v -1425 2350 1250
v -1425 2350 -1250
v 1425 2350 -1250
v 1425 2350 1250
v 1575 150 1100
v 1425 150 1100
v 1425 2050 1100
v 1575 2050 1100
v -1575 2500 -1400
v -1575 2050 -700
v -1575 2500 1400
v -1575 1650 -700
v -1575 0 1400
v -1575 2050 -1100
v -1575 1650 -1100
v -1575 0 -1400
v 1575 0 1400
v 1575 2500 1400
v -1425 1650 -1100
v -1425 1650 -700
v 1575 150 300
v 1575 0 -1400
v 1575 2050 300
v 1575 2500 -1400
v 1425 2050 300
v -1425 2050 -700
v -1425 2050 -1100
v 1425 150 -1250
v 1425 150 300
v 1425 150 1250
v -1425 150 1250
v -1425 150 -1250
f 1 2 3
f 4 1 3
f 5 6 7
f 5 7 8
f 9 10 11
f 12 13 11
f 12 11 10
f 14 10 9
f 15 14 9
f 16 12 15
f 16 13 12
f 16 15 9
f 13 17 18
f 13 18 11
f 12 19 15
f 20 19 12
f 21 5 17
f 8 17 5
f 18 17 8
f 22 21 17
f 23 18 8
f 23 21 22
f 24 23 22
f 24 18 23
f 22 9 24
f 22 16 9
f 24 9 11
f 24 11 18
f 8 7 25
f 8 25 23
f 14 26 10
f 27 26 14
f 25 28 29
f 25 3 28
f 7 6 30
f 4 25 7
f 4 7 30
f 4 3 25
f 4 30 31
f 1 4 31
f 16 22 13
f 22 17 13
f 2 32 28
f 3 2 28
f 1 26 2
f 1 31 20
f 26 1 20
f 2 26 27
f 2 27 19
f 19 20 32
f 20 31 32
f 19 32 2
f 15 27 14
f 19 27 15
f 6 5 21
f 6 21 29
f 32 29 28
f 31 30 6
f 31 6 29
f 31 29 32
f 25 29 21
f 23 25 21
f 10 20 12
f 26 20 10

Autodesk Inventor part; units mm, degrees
ref_plane "YZ Plane" through (0, 0, 0) normal (1, 0, 0) x (0, 1, 0)
ref_plane "XZ Plane" through (0, 0, 0) normal (0, 1, 0) x (-1, 0, 0)
ref_plane "XY Plane" through (0, 0, 0) normal (0, 0, 1) x (1, 0, 0)
sketch "Náčrt1" plane through (0, 0, 0) normal (0, 1, 0) x (-1, 0, 0)
  line L0 (-1575, 1400) -> (1575, 1400)
  line L1 (1575, 1400) -> (1575, -1400)
  line L2 (1575, -1400) -> (-1575, -1400)
  line L3 (-1575, -1400) -> (-1575, 1400)
  line L4 (-1575, 1400) -> (1575, -1400) construction
  line L5 (1575, 1400) -> (-1575, -1400) construction
  point P0 (0, 0)
  dimension "d0" = 3150
  dimension "d1" = 2800
extrude "Vysunutí1" add sketch "Náčrt1" along normal blind 150
sketch "Náčrt2" plane through (0, 150, 0) normal (0, 1, 0) x (1, 0, 0)
  line L0 (-1575, -1400) -> (1575, -1400) projected
  line L1 (1575, -1400) -> (1575, 1400) projected
  line L2 (1575, 1400) -> (-1575, 1400) projected
  line L3 (-1575, 1400) -> (-1575, -1400) projected
  line L4 (1425, -1250) -> (-1425, -1250)
  line L5 (-1425, -1250) -> (-1425, 1250)
  line L6 (-1425, 1250) -> (1425, 1250)
  line L7 (1425, -1250) -> (-1425, 1250) construction
  line L8 (-1425, -1250) -> (1425, 1250) construction
  line L9 (1425, -1100) -> (1575, -1100)
  line L10 (1575, -1400) -> (1575, 1400) projected
  line L11 (1425, -300) -> (1575, -300)
  line L12 (1425, 1250) -> (1425, -300)
  line L13 (1425, -1100) -> (1425, -1250)
  line L14 (1575, -300) -> (1575, 1400)
  line L15 (-1575, 1400) -> (-1575, -1400) projected
  line L16 (-1575, 1400) -> (-1575, -1400)
  line L17 (-1575, -1400) -> (1575, -1400) projected
  line L18 (-1575, -1400) -> (1575, -1400)
  line L19 (1575, -1400) -> (1575, -1100)
  point P0 (0, 0)
  dimension "d4" = 2850
  dimension "d5" = 2500
  dimension "d6" = 150
  dimension "d7" = 800
extrude "Vysunutí2" add sketch "Náčrt2" along normal blind 2200 contours L3 L2 L1 L11 L12 L6 L5 L4 L13 L9 L0
sketch "Náčrt3" plane through (0, 2350, 0) normal (0, 1, 0) x (1, 0, 0)
  line L0 (-1575, -1400) -> (1575, -1400) projected
  line L1 (1575, -1400) -> (1575, -1100) projected
  line L2 (1575, -1100) -> (1425, -1100) projected
  line L3 (1425, -1100) -> (1425, -1250) projected
  line L4 (1425, -1250) -> (-1425, -1250) projected
  line L5 (-1425, -1250) -> (-1425, 1250) projected
  line L6 (-1425, 1250) -> (1425, 1250) projected
  line L7 (1425, 1250) -> (1425, -300) projected
  line L8 (1425, -300) -> (1575, -300) projected
  line L9 (1575, -300) -> (1575, 1400) projected
  line L10 (1575, 1400) -> (-1575, 1400) projected
  line L11 (-1575, 1400) -> (-1575, -1400) projected
  line L12 (-1575, -1400) -> (1575, -1400)
  line L13 (1575, -1400) -> (1575, 1400)
  line L14 (1575, 1400) -> (-1575, 1400)
  line L15 (-1575, 1400) -> (-1575, -1400)
extrude "Vysunutí3" add sketch "Náčrt3" along normal blind 150
sketch "Náčrt4" plane through (0, 2350, 0) normal (0, -1, 0) x (1, 0, 0)
  line L0 (1575, 1100) -> (1425, 1100) projected
  line L1 (1425, 300) -> (1575, 300) projected
  line L2 (1425, 1100) -> (1575, 1100)
  line L3 (1575, 1100) -> (1575, 300)
  line L4 (1575, 300) -> (1425, 300)
  line L5 (1425, 300) -> (1425, 1100)
  point P0 (0, 0)
extrude "Vysunutí4" add sketch "Náčrt4" along normal blind 300
sketch "Náčrt5" plane through (-1425, 150, 1250) normal (1, 0, 0) x (0, 0, -1)
  line L0 (2500, 0) -> (0, 0) projected
  line L1 (2500, 0) -> (2500, 2200) projected
  line L2 (0, 2200) -> (2500, 2200) projected
  line L3 (0, 0) -> (0, 2200) projected
  line L4 (1950, 1900) -> (2350, 1900)
  line L5 (2350, 1900) -> (2350, 1500)
  line L6 (2350, 1500) -> (1950, 1500)
  line L7 (1950, 1500) -> (1950, 1900)
  point P0 (1250, -150)
  dimension "d14" = 400
  dimension "d15" = 400
  dimension "d16" = 150
  dimension "d17" = 300
extrude "Vysunutí5" cut sketch "Náčrt5" against normal up to next contours L4 L5 L6 L7
properties part number "Basement"
